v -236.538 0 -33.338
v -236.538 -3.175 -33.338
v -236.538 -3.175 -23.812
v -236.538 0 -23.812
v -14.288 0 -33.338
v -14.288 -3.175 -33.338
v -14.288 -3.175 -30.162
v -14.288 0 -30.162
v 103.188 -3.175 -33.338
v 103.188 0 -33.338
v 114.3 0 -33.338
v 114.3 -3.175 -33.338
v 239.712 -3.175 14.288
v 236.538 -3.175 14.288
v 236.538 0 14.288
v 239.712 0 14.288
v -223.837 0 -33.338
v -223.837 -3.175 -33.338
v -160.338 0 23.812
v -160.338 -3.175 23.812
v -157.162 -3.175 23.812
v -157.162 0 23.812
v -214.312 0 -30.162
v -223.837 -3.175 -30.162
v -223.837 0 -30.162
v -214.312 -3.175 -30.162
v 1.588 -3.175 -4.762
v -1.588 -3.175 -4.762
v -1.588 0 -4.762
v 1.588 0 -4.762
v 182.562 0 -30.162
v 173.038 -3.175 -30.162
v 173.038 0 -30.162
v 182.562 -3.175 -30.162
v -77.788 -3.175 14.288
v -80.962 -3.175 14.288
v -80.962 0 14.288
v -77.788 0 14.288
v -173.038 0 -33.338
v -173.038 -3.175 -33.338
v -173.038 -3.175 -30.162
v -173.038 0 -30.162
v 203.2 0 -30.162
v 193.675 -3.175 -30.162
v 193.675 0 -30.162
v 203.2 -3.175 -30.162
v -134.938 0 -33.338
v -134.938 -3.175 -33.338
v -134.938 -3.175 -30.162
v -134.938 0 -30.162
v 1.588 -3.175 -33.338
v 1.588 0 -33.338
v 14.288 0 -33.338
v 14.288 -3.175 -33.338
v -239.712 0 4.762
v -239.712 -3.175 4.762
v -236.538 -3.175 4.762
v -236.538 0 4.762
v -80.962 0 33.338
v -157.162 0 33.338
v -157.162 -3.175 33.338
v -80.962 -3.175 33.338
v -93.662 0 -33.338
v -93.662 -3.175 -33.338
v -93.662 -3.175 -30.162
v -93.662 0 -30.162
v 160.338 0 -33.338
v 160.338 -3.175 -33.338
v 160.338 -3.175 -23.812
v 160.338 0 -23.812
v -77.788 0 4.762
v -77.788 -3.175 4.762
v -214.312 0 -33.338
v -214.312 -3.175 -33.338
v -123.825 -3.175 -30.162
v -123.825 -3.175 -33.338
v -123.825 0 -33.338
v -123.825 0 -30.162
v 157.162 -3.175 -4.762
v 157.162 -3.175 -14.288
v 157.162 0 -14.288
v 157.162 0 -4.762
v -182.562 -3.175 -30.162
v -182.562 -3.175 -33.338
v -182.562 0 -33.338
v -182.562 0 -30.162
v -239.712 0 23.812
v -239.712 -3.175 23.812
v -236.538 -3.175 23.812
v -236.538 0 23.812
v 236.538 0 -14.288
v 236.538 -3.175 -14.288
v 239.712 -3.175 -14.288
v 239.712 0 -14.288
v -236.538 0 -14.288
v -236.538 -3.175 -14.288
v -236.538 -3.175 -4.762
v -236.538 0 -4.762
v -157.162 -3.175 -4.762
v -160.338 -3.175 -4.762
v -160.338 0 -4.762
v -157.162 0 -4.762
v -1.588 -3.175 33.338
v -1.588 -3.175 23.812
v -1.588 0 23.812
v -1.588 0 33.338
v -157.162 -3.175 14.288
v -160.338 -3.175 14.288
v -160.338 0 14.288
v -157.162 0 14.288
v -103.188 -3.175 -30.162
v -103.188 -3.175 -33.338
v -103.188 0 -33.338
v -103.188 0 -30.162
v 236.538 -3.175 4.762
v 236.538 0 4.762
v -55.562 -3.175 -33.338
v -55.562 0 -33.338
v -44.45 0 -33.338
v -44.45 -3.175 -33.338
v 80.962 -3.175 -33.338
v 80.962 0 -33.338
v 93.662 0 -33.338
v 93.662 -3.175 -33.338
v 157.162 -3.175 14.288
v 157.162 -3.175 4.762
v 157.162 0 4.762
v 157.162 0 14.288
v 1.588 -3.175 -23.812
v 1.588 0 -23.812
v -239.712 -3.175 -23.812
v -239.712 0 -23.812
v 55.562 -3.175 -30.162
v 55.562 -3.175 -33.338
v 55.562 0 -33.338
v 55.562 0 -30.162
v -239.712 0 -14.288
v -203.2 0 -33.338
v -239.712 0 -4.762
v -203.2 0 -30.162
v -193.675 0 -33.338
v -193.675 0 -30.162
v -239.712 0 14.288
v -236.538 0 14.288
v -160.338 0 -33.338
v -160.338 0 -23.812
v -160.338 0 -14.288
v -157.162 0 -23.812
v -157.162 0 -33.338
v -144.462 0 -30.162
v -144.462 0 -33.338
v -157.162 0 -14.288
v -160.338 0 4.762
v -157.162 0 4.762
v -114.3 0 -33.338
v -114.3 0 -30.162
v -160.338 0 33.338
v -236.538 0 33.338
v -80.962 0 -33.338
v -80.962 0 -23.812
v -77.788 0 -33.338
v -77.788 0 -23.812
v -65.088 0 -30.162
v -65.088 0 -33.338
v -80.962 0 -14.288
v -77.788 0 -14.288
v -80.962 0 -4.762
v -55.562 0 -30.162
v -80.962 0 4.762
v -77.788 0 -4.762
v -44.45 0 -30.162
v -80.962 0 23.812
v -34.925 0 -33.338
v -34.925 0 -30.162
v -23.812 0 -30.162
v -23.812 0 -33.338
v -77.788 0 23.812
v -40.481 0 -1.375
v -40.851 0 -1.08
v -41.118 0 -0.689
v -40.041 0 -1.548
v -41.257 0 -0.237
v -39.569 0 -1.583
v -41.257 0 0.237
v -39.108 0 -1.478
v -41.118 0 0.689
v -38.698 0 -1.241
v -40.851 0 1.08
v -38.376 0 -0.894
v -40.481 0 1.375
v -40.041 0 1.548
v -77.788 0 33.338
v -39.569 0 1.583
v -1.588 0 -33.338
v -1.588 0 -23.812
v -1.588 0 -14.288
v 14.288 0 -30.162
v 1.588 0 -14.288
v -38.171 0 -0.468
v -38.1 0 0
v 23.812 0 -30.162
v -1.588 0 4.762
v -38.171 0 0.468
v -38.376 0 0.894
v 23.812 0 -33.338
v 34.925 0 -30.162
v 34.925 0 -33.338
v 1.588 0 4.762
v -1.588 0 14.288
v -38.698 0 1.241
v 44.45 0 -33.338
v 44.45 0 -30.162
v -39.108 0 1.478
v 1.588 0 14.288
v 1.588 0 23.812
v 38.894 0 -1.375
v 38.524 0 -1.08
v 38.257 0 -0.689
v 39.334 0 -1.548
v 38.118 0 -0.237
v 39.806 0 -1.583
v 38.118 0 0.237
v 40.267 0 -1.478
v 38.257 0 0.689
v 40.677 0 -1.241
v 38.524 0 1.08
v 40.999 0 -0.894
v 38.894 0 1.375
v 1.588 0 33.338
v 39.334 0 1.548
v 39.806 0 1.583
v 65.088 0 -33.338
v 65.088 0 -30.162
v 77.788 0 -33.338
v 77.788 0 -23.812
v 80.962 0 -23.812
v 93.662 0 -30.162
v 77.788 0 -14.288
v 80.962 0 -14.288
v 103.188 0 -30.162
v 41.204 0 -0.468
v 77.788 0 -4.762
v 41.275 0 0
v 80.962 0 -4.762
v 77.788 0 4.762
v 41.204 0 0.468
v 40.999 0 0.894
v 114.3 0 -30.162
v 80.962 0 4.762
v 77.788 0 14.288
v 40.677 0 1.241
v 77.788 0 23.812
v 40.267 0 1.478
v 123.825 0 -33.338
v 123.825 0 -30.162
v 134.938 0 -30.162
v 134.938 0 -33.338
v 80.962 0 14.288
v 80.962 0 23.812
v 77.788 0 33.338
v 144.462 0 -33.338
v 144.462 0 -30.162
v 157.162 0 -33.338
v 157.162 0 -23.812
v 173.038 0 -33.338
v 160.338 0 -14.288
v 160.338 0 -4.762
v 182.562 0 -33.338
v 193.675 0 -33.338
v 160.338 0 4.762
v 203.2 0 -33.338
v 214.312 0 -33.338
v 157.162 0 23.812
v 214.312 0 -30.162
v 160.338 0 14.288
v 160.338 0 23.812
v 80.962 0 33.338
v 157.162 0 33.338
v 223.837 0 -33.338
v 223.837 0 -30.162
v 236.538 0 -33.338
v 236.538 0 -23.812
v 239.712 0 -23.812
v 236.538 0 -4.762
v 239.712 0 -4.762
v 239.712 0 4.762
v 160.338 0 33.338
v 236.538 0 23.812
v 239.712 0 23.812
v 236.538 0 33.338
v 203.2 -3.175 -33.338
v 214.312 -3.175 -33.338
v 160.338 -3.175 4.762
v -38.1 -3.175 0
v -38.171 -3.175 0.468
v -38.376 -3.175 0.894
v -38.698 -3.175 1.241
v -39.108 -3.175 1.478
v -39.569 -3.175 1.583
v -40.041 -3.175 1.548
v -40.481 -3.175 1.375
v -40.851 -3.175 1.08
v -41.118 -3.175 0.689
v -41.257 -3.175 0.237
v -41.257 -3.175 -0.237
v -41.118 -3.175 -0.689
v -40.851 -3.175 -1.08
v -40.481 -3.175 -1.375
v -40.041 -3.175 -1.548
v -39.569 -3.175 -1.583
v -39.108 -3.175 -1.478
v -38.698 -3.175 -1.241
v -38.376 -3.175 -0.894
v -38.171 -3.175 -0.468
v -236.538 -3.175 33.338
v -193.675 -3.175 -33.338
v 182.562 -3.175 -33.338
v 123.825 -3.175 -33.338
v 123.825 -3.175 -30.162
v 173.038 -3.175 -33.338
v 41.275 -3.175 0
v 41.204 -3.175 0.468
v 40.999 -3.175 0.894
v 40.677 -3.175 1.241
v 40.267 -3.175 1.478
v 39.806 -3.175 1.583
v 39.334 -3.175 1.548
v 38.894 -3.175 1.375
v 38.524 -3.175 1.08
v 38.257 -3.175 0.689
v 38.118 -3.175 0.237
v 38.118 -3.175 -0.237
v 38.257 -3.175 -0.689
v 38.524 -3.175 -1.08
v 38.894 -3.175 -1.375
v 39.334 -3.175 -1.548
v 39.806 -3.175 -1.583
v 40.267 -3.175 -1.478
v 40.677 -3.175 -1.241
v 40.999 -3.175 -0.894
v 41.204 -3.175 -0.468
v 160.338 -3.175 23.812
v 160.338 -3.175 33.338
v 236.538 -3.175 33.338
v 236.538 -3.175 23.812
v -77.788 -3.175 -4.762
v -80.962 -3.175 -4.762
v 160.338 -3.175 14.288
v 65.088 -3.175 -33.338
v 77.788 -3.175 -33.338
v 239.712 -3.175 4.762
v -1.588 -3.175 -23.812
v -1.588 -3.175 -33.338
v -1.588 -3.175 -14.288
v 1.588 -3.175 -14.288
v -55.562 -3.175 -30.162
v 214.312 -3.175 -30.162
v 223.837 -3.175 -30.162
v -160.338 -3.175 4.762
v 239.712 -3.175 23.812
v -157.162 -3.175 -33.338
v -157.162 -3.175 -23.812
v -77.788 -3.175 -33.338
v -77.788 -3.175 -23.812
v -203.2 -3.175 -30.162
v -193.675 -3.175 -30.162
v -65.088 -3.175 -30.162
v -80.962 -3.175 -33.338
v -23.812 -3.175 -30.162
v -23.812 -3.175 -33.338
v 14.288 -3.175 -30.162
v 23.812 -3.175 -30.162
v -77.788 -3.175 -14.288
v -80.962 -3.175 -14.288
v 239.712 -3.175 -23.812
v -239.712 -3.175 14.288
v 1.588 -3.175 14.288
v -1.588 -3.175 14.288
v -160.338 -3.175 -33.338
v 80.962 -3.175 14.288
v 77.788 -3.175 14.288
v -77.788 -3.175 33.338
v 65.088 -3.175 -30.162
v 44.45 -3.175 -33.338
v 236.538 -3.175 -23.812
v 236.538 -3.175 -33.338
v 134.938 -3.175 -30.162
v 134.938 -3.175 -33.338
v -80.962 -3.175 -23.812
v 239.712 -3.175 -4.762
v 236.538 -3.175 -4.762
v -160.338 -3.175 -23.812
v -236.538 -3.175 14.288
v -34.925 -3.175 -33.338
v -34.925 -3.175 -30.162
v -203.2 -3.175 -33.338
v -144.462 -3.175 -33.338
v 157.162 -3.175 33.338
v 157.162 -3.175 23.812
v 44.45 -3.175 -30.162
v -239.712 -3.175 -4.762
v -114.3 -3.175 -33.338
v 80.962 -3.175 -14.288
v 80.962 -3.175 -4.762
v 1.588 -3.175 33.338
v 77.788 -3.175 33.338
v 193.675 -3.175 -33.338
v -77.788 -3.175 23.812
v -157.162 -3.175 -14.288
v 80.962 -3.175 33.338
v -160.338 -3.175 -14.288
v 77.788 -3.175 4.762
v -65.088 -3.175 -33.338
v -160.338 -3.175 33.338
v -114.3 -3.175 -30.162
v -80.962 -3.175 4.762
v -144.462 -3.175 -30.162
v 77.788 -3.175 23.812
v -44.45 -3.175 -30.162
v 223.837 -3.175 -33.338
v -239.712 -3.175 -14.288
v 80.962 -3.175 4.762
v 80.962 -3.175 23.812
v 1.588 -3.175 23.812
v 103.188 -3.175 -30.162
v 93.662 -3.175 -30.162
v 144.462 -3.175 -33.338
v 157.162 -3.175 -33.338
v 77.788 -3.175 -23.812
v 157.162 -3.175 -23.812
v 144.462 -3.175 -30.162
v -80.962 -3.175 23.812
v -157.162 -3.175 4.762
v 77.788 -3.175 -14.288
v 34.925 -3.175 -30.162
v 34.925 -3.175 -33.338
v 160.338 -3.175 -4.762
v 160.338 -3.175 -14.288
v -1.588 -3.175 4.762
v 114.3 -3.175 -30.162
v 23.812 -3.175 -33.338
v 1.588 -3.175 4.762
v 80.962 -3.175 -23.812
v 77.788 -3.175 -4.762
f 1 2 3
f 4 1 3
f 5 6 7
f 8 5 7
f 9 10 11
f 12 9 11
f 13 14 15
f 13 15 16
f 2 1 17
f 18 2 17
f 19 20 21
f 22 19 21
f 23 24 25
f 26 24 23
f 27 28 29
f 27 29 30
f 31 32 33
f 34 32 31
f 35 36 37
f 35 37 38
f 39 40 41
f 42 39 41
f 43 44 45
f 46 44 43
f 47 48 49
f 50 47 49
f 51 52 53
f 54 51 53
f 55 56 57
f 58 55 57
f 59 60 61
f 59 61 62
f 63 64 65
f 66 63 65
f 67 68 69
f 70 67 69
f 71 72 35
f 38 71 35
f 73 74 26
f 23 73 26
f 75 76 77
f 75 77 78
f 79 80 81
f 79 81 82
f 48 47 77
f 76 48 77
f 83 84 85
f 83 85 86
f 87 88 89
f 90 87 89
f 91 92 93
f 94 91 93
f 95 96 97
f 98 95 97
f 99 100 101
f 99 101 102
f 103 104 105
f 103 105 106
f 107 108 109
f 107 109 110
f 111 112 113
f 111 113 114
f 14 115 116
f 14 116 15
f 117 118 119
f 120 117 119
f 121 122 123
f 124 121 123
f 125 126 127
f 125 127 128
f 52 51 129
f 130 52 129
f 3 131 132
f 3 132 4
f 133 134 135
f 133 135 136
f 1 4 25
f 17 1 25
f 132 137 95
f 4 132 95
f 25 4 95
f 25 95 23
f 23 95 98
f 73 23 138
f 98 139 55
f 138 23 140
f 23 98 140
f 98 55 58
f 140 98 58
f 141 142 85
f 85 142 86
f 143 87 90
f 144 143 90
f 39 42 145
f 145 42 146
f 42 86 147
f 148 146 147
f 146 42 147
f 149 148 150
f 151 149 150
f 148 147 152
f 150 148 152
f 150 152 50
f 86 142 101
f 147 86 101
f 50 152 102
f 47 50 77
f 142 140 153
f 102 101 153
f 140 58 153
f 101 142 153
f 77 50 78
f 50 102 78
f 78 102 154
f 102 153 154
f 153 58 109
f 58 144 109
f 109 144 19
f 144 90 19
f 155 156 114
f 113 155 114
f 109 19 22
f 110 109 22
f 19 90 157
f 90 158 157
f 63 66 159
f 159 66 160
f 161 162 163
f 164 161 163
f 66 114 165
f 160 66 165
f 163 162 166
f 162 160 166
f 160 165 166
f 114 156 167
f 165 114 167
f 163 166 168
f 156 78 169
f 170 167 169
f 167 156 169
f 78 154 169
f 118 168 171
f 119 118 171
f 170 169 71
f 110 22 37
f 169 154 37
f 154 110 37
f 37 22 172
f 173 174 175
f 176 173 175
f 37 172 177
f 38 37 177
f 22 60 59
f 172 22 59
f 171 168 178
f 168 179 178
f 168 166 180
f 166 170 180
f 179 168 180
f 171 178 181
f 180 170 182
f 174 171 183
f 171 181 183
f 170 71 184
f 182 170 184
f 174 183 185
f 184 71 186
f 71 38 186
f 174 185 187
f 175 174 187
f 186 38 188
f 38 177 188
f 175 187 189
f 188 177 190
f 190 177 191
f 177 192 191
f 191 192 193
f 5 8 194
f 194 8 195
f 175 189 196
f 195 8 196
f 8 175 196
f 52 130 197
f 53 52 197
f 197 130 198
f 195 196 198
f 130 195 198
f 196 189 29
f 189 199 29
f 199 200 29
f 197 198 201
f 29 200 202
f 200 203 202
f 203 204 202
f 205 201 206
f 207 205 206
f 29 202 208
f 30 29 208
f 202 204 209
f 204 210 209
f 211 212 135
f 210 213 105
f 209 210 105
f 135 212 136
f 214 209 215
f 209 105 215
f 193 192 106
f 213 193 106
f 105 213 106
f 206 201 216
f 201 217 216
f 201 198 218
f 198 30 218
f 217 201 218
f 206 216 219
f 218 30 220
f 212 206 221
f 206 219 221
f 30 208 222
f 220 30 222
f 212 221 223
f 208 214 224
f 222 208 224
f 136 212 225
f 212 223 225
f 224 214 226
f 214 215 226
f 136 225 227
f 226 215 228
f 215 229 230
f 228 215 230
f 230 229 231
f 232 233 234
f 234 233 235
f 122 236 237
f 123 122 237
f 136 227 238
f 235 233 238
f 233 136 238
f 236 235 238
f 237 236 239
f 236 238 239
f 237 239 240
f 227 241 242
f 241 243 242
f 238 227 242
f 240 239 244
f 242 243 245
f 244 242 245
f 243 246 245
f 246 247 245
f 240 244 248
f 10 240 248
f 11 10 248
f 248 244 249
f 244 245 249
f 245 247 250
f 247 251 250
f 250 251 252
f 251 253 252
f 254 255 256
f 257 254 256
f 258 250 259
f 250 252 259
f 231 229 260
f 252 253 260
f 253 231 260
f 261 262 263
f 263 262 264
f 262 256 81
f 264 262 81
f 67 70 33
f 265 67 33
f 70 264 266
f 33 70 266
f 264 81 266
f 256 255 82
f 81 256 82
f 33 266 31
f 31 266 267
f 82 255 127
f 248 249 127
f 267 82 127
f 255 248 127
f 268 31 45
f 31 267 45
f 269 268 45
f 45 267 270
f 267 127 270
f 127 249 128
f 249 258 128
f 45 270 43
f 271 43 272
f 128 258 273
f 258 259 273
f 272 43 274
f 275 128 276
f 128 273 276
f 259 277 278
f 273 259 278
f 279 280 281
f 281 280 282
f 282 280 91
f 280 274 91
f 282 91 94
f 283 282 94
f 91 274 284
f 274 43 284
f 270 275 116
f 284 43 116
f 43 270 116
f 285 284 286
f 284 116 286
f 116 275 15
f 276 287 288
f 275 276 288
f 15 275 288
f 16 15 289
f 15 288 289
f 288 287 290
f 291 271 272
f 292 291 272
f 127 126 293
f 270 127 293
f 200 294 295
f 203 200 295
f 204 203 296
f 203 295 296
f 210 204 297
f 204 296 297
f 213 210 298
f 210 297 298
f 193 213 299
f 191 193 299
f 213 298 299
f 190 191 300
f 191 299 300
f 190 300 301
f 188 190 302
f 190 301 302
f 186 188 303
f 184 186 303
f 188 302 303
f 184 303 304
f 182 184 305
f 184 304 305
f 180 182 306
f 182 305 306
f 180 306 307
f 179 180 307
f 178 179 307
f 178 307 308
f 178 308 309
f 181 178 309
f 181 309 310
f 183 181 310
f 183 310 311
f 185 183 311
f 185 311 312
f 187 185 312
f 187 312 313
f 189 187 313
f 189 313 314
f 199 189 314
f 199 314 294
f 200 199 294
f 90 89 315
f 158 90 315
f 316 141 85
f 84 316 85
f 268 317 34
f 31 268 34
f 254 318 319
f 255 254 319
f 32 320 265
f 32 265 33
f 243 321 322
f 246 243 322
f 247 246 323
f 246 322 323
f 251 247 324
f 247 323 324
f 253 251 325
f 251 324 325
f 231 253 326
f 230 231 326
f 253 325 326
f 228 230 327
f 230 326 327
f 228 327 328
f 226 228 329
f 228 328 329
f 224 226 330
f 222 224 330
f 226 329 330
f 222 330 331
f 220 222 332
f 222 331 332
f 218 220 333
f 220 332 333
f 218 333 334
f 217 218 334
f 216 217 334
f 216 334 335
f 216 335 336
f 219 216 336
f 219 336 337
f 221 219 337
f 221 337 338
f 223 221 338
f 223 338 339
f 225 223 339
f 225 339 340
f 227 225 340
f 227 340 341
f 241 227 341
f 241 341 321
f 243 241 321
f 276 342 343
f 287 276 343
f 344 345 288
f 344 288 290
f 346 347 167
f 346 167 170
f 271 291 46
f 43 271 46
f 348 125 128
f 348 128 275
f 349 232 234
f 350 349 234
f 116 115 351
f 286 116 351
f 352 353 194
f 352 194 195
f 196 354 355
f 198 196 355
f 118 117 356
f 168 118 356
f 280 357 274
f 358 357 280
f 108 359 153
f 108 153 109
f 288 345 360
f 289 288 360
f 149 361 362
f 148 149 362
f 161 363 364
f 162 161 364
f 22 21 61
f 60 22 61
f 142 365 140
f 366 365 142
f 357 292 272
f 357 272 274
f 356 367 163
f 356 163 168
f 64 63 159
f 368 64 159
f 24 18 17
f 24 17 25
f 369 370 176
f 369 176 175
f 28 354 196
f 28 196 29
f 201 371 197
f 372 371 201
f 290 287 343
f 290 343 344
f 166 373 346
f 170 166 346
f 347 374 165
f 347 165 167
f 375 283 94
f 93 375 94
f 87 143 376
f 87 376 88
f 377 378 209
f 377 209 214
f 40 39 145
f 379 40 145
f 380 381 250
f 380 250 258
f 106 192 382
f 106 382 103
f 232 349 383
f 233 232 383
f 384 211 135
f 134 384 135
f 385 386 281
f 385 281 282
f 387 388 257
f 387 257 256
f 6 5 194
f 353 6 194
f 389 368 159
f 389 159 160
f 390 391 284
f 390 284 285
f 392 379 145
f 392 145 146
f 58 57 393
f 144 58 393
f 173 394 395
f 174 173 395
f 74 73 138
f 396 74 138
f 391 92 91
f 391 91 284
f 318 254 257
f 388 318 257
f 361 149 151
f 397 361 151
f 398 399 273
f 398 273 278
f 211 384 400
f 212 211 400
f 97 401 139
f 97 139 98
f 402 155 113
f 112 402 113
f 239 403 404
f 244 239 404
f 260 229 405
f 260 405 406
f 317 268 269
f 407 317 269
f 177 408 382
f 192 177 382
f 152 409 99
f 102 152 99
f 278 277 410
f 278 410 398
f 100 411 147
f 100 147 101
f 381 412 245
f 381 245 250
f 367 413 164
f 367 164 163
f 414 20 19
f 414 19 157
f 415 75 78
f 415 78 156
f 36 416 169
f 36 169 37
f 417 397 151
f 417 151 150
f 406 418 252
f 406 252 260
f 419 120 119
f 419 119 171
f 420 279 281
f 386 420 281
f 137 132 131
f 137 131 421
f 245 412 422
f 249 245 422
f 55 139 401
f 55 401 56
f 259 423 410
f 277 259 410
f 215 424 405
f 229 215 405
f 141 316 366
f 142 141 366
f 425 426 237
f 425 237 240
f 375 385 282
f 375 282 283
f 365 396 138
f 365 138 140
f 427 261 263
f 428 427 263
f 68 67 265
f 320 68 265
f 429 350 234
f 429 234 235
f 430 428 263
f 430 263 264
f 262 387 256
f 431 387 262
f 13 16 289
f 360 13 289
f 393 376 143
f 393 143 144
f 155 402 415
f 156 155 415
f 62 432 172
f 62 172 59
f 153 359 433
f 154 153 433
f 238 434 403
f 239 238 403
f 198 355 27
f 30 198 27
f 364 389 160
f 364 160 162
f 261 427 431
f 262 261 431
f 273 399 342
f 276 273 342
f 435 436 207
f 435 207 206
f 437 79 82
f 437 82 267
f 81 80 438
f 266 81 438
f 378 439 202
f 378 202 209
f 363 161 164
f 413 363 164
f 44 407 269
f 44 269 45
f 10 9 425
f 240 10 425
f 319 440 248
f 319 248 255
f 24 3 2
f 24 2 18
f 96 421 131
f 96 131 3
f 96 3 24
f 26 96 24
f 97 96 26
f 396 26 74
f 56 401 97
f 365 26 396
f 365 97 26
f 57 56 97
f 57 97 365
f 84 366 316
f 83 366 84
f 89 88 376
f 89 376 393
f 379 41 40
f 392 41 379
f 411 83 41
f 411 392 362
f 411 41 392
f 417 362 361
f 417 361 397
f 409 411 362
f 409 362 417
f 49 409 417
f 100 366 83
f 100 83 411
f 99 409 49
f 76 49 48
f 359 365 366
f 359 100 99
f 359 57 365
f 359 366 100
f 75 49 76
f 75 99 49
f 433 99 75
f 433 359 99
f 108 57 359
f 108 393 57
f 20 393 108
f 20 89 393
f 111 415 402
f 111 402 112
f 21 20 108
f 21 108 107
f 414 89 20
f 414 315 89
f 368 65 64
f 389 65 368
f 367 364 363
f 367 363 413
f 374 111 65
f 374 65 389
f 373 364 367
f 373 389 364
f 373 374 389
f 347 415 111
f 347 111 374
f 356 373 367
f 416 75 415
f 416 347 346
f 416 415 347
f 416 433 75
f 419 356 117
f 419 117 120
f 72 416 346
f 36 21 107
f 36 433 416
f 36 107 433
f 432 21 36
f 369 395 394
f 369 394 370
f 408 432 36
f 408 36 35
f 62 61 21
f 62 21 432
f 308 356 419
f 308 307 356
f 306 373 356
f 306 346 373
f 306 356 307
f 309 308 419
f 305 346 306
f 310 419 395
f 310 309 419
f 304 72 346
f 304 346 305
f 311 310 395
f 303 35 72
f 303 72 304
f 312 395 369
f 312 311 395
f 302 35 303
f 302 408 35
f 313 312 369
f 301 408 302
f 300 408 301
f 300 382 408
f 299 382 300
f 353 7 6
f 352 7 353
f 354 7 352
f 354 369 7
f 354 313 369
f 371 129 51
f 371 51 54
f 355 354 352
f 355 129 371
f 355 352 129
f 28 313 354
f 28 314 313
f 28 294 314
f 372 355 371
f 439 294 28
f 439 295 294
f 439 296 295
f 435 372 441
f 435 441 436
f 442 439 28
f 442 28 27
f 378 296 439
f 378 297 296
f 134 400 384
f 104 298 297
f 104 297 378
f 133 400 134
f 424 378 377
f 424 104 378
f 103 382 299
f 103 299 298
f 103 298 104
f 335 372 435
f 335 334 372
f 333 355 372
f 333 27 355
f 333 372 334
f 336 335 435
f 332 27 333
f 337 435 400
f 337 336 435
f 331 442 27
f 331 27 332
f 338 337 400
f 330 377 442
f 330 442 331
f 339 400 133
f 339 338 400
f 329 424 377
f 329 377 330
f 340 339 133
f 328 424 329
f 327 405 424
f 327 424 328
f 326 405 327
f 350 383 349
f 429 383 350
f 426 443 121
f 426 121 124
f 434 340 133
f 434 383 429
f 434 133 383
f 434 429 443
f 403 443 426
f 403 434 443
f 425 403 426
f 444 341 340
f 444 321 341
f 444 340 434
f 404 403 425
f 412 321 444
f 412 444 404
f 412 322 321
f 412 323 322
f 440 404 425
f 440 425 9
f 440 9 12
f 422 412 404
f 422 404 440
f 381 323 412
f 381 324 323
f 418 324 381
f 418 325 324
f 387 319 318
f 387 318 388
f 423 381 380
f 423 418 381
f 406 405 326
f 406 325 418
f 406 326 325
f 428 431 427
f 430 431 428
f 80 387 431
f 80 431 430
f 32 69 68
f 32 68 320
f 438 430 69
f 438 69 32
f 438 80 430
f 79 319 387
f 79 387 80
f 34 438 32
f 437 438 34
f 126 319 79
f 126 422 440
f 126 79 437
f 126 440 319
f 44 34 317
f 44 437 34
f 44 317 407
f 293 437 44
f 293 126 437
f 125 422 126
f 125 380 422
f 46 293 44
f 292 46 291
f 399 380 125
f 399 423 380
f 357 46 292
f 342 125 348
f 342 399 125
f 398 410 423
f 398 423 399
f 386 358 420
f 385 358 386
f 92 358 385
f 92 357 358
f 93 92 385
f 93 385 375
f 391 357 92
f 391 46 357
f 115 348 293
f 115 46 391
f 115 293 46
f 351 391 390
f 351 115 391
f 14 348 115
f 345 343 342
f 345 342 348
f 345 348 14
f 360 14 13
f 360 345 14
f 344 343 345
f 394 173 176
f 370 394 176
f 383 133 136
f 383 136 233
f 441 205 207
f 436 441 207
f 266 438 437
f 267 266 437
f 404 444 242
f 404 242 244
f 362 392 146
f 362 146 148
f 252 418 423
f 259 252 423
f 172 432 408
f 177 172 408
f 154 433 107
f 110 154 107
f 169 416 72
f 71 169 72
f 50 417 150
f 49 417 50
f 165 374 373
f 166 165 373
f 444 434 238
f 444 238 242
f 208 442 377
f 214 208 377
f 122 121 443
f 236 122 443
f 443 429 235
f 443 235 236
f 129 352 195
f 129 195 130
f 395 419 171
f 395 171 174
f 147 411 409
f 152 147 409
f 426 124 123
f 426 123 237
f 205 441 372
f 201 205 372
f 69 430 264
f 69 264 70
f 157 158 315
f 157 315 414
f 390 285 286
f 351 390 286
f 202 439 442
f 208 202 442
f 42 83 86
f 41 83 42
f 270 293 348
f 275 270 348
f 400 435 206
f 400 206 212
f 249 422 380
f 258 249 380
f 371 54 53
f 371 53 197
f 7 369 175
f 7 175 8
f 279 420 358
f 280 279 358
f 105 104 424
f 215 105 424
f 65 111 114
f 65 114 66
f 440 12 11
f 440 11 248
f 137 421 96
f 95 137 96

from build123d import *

# Parameters (mm, degrees)
F0_W     = 479.425
F0_H     = 66.675
F1_DEPTH = 3.175
F2_W     = 3.175
F2_H     = 9.525
F3_DEPTH = 3.176
F4_W     = 9.525
F4_H     = 3.175
F5_DEPTH = 3.176
F6_R     = 1.5875
F7_DEPTH = 3.176


with BuildPart() as f1:
    # F0 (on Front) → F1 (new body)
    with BuildSketch(Plane.XZ):
        Rectangle(F0_W, F0_H)
    extrude(amount=F1_DEPTH)

    # F2 (on face) → F3 (cut, through all)
    with BuildSketch(Plane.XZ.offset(3.175)):
        with Locations((-238.125, -28.575)):
            Rectangle(F2_W, F2_H)
        with Locations((-238.125, -9.525)):
            Rectangle(F2_W, F2_H)
        with Locations((-238.125, 9.525)):
            Rectangle(F2_W, F2_H)
        with Locations((-238.125, 28.575)):
            Rectangle(F2_W, F2_H)
        with Locations((-158.75, -28.575)):
            Rectangle(F2_W, F2_H)
        with Locations((-158.75, -9.525)):
            Rectangle(F2_W, F2_H)
        with Locations((-158.75, 9.525)):
            Rectangle(F2_W, F2_H)
        with Locations((-158.75, 28.575)):
            Rectangle(F2_W, F2_H)
        with Locations((-79.375, -28.575)):
            Rectangle(F2_W, F2_H)
        with Locations((-79.375, -9.525)):
            Rectangle(F2_W, F2_H)
        with Locations((-79.375, 9.525)):
            Rectangle(F2_W, F2_H)
        with Locations((-79.375, 28.575)):
            Rectangle(F2_W, F2_H)
        with Locations((0, -28.575)):
            Rectangle(F2_W, F2_H)
        with Locations((0, -9.525)):
            Rectangle(F2_W, F2_H)
        with Locations((0, 9.525)):
            Rectangle(F2_W, F2_H)
        with Locations((0, 28.575)):
            Rectangle(F2_W, F2_H)
        with Locations((79.375, -28.575)):
            Rectangle(F2_W, F2_H)
        with Locations((79.375, -9.525)):
            Rectangle(F2_W, F2_H)
        with Locations((79.375, 9.525)):
            Rectangle(F2_W, F2_H)
        with Locations((79.375, 28.575)):
            Rectangle(F2_W, F2_H)
        with Locations((158.75, -28.575)):
            Rectangle(F2_W, F2_H)
        with Locations((158.75, -9.525)):
            Rectangle(F2_W, F2_H)
        with Locations((158.75, 9.525)):
            Rectangle(F2_W, F2_H)
        with Locations((158.75, 28.575)):
            Rectangle(F2_W, F2_H)
        with Locations((238.125, -28.575)):
            Rectangle(F2_W, F2_H)
        with Locations((238.125, -9.525)):
            Rectangle(F2_W, F2_H)
        with Locations((238.125, 9.525)):
            Rectangle(F2_W, F2_H)
        with Locations((238.125, 28.575)):
            Rectangle(F2_W, F2_H)
    extrude(amount=-F3_DEPTH, mode=Mode.SUBTRACT)

    # F4 (on face) → F5 (cut, through all)
    with BuildSketch(Plane.XZ.offset(3.175)):
        with Locations((-219.075, -31.75)):
            Rectangle(F4_W, F4_H)
        with Locations((-198.4375, -31.75)):
            Rectangle(F4_W, F4_H)
        with Locations((-177.8, -31.75)):
            Rectangle(F4_W, F4_H)
        with Locations((-139.7, -31.75)):
            Rectangle(F4_W, F4_H)
        with Locations((-119.0625, -31.75)):
            Rectangle(F4_W, F4_H)
        with Locations((-98.425, -31.75)):
            Rectangle(F4_W, F4_H)
        with Locations((-60.325, -31.75)):
            Rectangle(F4_W, F4_H)
        with Locations((-39.6875, -31.75)):
            Rectangle(F4_W, F4_H)
        with Locations((-19.05, -31.75)):
            Rectangle(F4_W, F4_H)
        with Locations((19.05, -31.75)):
            Rectangle(F4_W, F4_H)
        with Locations((39.6875, -31.75)):
            Rectangle(F4_W, F4_H)
        with Locations((60.325, -31.75)):
            Rectangle(F4_W, F4_H)
        with Locations((98.425, -31.75)):
            Rectangle(F4_W, F4_H)
        with Locations((119.0625, -31.75)):
            Rectangle(F4_W, F4_H)
        with Locations((139.7, -31.75)):
            Rectangle(F4_W, F4_H)
        with Locations((177.8, -31.75)):
            Rectangle(F4_W, F4_H)
        with Locations((198.4375, -31.75)):
            Rectangle(F4_W, F4_H)
        with Locations((219.075, -31.75)):
            Rectangle(F4_W, F4_H)
    extrude(amount=-F5_DEPTH, mode=Mode.SUBTRACT)

    # F6 (on face) → F7 (cut, through all)
    with BuildSketch(Plane.XZ.offset(3.175)):
        with Locations((-39.6875, 0)):
            Circle(F6_R)
        with Locations((39.6875, 0)):
            Circle(F6_R)
    extrude(amount=-F7_DEPTH, mode=Mode.SUBTRACT)


solid = f1.part
